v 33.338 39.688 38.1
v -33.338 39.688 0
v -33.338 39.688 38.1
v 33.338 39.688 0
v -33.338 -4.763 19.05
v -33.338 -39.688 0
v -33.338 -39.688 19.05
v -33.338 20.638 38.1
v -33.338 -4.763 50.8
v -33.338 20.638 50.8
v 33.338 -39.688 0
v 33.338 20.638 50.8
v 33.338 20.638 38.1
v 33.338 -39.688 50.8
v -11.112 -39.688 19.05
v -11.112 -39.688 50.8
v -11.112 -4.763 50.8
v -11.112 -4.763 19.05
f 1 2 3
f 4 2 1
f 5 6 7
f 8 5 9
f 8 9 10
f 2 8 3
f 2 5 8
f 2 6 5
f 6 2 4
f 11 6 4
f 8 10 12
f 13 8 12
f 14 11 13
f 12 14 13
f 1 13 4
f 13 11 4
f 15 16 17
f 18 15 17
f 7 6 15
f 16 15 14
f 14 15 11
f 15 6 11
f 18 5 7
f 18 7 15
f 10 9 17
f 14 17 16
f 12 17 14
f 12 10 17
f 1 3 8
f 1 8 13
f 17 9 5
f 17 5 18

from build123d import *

# Parameters (mm, degrees)
F0_W     = 66.675
F0_H     = 79.375
F1_DEPTH = 50.8
F2_W     = 66.675
F2_H     = 19.05
F3_DEPTH = 12.7
F4_W     = 22.225
F4_H     = 34.925
F5_DEPTH = 31.75


with BuildPart() as f1:
    # F0 (on Top) → F1 (new body)
    with BuildSketch(Plane.XY):
        Rectangle(F0_W, F0_H)
    extrude(amount=F1_DEPTH)

    # F2 (on face) → F3 (cut)
    with BuildSketch(Plane.XY.offset(50.8)):
        with Locations((0, 30.1625)):
            Rectangle(F2_W, F2_H)
    extrude(amount=-F3_DEPTH, mode=Mode.SUBTRACT)

    # F4 (on face) → F5 (cut)
    with BuildSketch(Plane.XY.offset(50.8)):
        with Locations((-22.225, -22.225)):
            Rectangle(F4_W, F4_H)
    extrude(amount=-F5_DEPTH, mode=Mode.SUBTRACT)


solid = f1.part
